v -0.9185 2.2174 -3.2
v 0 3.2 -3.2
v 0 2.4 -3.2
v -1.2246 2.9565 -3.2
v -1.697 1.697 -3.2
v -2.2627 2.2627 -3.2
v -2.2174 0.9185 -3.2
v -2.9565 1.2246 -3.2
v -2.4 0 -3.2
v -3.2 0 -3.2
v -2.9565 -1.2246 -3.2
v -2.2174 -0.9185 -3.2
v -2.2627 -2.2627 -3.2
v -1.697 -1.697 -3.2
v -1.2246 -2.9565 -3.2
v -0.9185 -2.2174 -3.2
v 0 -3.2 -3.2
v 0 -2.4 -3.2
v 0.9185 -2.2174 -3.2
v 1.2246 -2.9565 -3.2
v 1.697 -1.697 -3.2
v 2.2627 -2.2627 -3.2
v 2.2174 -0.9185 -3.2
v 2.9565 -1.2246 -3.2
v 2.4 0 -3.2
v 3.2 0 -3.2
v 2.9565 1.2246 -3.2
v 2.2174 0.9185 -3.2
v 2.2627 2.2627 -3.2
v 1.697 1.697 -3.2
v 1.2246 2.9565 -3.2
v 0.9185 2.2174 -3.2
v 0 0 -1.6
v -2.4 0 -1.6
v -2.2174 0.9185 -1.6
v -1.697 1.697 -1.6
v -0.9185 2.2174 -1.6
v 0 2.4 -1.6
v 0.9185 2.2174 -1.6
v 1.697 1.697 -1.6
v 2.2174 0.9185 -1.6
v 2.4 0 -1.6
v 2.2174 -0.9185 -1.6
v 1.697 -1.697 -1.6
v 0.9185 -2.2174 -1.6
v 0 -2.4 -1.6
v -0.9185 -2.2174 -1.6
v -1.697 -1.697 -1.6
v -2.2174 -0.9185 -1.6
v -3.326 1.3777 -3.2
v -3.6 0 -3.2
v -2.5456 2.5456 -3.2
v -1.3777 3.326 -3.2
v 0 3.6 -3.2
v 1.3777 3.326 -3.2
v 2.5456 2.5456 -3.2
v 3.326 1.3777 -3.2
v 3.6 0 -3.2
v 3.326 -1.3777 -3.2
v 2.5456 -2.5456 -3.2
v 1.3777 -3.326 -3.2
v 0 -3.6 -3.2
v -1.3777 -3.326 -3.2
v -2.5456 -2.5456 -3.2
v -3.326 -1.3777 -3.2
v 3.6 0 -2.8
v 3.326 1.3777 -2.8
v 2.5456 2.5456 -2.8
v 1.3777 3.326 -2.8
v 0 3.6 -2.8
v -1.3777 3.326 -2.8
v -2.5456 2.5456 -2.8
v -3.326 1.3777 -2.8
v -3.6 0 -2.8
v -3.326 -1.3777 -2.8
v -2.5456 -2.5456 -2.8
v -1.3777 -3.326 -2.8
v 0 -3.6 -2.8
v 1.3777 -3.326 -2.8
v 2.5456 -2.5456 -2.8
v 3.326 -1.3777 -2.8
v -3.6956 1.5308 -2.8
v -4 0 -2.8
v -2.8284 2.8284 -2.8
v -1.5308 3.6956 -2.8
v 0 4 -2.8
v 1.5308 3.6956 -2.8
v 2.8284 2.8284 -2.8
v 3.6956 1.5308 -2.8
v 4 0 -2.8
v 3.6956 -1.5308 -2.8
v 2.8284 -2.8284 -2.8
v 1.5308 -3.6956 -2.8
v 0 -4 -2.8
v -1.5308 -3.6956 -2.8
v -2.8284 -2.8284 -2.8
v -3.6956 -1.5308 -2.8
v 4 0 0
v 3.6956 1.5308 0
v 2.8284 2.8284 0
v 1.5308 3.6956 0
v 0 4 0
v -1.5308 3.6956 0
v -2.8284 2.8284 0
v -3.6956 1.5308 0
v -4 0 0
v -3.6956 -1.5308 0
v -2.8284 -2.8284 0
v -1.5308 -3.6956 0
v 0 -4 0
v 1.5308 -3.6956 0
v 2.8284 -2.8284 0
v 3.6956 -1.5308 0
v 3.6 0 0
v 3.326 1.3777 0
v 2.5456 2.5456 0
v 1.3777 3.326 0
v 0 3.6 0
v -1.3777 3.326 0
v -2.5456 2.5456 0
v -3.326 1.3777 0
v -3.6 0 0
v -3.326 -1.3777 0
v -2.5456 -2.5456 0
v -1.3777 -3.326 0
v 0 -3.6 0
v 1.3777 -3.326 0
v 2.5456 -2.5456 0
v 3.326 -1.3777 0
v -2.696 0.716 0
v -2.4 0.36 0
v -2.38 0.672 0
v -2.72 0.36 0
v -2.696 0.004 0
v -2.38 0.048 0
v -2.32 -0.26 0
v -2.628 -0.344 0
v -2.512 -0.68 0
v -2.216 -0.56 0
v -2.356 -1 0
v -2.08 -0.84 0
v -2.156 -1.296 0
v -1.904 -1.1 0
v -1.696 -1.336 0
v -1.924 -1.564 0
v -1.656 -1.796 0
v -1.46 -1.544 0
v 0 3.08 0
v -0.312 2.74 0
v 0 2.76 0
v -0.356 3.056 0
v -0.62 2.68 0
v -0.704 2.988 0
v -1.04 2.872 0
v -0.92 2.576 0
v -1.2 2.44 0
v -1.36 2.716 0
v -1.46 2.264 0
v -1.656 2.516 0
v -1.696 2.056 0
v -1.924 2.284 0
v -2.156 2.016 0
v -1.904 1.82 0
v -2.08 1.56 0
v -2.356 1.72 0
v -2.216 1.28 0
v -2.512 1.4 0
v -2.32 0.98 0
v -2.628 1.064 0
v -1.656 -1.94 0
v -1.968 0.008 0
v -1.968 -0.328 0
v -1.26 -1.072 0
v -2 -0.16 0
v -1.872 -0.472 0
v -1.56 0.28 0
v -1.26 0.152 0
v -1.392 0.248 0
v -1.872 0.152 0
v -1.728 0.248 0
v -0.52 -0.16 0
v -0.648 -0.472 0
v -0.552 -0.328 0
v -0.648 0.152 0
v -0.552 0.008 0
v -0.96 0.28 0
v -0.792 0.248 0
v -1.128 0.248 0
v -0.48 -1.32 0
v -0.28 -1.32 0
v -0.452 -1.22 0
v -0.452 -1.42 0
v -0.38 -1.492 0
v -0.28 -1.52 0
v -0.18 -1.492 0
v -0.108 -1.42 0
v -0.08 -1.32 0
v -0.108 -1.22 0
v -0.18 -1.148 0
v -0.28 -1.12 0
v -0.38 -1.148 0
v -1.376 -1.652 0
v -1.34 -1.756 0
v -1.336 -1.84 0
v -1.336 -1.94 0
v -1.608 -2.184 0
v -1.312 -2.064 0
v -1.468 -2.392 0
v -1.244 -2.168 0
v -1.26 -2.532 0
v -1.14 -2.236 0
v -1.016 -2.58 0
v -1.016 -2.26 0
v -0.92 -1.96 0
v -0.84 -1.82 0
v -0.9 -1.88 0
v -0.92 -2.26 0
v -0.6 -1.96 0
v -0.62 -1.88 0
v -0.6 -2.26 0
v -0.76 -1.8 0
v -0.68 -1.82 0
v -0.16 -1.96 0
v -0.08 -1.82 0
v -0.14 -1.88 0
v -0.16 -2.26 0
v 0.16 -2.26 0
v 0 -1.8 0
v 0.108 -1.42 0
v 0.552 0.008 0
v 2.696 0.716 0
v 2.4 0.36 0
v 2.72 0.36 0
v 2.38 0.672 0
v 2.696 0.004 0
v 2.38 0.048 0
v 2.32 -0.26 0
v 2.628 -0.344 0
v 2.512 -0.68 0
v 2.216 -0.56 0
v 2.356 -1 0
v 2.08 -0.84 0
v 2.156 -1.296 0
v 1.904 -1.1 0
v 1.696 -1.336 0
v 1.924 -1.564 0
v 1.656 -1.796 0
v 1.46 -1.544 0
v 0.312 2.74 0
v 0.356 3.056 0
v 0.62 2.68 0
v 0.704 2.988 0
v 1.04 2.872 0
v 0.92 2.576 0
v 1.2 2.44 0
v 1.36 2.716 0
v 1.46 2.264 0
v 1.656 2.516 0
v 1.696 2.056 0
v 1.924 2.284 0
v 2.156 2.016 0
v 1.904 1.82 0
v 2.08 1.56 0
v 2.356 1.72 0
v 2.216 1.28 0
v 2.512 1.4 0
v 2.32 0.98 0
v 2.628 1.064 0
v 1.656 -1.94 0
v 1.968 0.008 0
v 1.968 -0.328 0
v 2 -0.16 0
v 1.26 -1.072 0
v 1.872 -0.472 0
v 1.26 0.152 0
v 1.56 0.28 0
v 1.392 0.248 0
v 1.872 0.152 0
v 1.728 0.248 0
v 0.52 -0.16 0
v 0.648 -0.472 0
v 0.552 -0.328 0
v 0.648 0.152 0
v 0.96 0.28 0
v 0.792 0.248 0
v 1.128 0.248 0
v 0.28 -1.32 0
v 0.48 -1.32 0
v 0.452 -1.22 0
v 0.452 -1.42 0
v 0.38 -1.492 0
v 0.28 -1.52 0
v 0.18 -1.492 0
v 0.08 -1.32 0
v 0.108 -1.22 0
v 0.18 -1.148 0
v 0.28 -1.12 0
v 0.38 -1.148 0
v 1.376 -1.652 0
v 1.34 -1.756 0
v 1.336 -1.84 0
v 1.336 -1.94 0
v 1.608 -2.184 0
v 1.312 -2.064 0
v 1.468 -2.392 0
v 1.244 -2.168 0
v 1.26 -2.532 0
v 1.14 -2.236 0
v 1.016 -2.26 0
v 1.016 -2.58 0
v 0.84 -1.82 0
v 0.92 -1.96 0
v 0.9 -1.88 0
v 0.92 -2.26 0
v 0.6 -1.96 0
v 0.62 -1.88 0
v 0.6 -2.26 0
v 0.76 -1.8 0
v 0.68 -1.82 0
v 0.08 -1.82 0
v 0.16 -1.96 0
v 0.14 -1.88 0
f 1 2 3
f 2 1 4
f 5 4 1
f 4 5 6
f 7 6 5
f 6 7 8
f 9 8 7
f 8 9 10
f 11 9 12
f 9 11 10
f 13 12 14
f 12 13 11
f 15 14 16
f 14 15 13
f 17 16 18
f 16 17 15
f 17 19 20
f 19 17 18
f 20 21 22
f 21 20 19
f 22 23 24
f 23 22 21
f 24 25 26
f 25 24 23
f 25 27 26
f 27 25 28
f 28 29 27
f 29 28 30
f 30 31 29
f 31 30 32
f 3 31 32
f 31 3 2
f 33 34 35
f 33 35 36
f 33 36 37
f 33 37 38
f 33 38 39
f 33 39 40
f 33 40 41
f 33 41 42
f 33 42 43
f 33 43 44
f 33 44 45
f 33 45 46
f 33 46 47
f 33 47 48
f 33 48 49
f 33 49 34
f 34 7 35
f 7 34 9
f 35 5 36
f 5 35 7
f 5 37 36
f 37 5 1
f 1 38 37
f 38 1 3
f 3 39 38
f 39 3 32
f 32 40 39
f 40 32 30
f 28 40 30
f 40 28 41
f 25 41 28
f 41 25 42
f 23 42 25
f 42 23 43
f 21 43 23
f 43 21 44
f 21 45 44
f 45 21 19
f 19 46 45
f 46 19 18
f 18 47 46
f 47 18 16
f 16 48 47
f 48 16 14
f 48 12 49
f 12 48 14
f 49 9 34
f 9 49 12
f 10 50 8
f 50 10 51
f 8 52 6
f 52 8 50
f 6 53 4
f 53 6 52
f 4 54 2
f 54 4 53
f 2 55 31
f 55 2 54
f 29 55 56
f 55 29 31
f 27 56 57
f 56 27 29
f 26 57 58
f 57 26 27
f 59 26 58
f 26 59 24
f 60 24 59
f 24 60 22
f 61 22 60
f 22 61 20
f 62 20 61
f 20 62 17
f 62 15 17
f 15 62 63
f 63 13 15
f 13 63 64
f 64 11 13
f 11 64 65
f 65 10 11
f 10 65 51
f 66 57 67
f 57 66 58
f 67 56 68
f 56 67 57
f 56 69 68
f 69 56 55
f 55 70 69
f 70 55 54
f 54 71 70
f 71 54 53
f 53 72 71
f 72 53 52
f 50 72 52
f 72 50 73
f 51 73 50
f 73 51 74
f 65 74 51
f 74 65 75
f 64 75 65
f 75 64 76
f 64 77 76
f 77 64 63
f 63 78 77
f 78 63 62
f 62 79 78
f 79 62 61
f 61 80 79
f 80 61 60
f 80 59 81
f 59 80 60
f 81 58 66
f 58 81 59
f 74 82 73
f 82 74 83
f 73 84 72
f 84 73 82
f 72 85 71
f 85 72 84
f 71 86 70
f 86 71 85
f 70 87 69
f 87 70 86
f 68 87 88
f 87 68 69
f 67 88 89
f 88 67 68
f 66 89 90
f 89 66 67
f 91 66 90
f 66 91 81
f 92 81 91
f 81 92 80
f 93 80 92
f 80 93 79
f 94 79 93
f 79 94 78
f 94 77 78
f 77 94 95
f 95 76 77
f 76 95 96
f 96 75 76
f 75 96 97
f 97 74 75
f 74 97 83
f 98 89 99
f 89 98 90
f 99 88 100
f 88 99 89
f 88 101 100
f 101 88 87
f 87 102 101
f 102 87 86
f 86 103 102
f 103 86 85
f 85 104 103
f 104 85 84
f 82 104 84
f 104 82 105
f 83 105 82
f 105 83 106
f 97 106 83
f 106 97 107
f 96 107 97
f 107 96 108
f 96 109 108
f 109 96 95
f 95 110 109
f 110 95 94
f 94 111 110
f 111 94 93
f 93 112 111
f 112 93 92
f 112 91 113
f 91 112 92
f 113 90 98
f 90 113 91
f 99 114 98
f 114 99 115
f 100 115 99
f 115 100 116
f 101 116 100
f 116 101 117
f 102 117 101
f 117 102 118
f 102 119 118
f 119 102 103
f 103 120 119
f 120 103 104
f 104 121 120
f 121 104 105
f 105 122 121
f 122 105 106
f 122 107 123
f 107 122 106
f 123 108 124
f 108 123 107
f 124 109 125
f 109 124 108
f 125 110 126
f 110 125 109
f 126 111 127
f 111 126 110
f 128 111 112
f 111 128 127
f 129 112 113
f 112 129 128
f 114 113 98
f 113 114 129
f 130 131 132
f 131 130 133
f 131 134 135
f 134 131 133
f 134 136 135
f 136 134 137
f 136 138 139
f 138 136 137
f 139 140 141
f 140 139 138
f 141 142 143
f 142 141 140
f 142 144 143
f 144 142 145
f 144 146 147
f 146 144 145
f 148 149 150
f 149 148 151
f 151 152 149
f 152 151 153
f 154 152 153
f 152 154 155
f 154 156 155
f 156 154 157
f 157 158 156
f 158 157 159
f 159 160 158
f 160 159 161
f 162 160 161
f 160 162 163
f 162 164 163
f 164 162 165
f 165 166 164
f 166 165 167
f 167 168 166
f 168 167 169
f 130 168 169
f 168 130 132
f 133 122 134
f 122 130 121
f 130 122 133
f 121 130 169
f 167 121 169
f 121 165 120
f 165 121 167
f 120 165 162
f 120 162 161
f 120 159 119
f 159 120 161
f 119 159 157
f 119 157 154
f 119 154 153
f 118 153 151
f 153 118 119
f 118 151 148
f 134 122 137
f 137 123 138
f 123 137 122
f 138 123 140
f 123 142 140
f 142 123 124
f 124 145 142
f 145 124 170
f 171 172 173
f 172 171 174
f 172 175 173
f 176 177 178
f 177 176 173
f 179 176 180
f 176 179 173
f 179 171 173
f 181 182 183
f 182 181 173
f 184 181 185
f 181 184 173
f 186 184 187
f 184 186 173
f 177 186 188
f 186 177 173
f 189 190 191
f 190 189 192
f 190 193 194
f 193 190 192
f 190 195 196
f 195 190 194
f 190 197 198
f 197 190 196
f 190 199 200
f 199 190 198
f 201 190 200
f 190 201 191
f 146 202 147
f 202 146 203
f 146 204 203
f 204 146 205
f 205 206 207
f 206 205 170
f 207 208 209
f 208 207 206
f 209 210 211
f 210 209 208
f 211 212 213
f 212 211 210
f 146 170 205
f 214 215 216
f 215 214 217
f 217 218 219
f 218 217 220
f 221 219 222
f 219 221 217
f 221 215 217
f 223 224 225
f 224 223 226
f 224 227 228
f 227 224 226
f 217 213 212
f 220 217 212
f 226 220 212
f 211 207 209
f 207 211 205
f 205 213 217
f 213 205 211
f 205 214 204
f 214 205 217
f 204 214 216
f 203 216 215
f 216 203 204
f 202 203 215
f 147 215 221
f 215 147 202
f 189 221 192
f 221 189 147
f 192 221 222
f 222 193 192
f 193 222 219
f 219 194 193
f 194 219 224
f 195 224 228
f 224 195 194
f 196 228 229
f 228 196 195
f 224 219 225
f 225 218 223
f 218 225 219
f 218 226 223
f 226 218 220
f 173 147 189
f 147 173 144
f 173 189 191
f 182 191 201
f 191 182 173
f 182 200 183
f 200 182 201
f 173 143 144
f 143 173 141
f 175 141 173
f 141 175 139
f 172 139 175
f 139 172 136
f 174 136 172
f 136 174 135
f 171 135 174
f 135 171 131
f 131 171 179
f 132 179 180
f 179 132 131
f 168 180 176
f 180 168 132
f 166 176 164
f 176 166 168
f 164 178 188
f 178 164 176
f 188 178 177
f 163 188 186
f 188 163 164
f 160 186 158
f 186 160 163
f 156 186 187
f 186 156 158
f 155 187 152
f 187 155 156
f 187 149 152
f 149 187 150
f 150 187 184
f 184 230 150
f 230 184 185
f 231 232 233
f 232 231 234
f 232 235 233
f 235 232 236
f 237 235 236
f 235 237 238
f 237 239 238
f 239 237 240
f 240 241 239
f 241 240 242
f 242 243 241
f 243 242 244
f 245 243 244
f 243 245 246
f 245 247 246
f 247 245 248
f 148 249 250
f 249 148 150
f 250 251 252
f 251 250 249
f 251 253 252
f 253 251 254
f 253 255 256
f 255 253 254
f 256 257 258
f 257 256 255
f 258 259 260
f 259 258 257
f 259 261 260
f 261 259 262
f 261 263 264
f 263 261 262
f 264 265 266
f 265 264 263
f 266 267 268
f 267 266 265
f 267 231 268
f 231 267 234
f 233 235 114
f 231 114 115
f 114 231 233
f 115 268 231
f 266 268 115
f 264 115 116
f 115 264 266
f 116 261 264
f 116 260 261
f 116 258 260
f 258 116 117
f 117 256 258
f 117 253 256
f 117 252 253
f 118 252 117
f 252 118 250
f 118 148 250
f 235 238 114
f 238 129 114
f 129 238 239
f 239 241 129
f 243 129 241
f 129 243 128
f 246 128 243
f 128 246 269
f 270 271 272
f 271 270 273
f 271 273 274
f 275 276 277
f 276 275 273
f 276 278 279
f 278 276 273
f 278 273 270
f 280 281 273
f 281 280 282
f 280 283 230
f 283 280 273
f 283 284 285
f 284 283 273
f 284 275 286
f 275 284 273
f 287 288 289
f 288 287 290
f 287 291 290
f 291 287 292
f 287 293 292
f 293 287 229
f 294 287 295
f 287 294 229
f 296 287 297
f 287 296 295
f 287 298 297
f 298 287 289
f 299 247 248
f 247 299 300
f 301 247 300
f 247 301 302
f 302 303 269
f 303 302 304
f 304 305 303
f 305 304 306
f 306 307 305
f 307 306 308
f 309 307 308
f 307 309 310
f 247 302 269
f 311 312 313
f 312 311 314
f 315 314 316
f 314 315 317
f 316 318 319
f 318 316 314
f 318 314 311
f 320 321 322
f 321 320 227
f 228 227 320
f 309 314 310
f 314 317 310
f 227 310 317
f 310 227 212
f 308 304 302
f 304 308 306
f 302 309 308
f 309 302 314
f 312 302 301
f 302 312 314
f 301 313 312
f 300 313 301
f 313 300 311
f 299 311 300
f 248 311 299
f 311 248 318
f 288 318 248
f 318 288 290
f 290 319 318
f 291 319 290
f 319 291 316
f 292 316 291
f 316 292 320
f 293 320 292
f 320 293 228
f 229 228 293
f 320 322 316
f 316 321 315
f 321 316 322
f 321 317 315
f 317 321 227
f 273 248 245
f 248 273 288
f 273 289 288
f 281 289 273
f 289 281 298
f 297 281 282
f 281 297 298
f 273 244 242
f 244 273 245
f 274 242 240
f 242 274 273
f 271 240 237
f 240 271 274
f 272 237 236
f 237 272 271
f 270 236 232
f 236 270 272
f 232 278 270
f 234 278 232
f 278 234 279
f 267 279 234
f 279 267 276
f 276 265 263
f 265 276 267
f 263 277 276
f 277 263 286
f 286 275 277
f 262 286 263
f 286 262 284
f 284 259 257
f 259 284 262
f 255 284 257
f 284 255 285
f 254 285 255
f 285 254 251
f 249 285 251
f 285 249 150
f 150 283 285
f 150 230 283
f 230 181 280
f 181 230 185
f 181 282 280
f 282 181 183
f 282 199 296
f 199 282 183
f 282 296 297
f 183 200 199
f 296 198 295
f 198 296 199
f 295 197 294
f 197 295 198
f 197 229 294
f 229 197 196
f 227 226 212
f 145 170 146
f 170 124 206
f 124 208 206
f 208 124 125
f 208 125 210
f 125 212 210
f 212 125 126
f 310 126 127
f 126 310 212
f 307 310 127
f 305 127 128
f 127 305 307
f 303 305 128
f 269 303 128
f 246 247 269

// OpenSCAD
use <../lib.scad>
use <../p/4-4ering.scad>
use <s/98138s01.scad>
$fa=1; $fs=0.2;
function ldraw_lib__98138p1c(realsolid=false) = [
// 0 Tile  1 x  1 Round with Medium Lavender Skull Outline and Hearts as Eyes on Medium Azure Background Pattern
// 0 Name: 98138p1c.dat
// 0 Author: Gerald Lasser [GeraldLasser]
// 0 !LDRAW_ORG Part UPDATE 2022-01
// 0 !LICENSE Licensed under CC BY 2.0 and CC BY 4.0 : see CAreadme.txt
// 
// 0 BFC CERTIFY CCW
  [0,"BFC","CERTIFY"],
  [0,"BFC","CCW"],
// 
// 0 !KEYWORDS Bricklink 98138pb132, Dots, Set 41908
// 
// 0 !HISTORY 2022-01-14 [PTadmin] Official Update 2022-01
// 
// 
// 1 16 0 0 0 1 0 0 0 1 0 0 0 1 s\98138s01.dat
  [1,16,0,0,0,1,0,0,0,1,0,0,0,1, ldraw_lib__s__98138s01(realsolid)],
// 1 322 0 0 0 9 0 0 0 1 0 0 0 9 4-4ering.dat
  [1,322,0,0,0,9,0,0,0,1,0,0,0,9, ldraw_lib__4_4ering(realsolid)],
// 4 30 -6 0 .9 -5.95 0 1.68 -6.74 0 1.79 -6.8 0 .9
  [4,30,-6,0,.9,-5.95,0,1.68,-6.74,0,1.79,-6.8,0,.9],
// 4 30 -5.95 0 .12 -6 0 .9 -6.8 0 .9 -6.74 0 .01
  [4,30,-5.95,0,.12,-6,0,.9,-6.8,0,.9,-6.74,0,.01],
// 4 30 -5.8 0 -.65 -5.95 0 .12 -6.74 0 .01 -6.57 0 -.86
  [4,30,-5.8,0,-.65,-5.95,0,.12,-6.74,0,.01,-6.57,0,-.86],
// 4 30 -5.54 0 -1.4 -5.8 0 -.65 -6.57 0 -.86 -6.28 0 -1.7
  [4,30,-5.54,0,-1.4,-5.8,0,-.65,-6.57,0,-.86,-6.28,0,-1.7],
// 4 30 -5.2 0 -2.1 -5.54 0 -1.4 -6.28 0 -1.7 -5.89 0 -2.5
  [4,30,-5.2,0,-2.1,-5.54,0,-1.4,-6.28,0,-1.7,-5.89,0,-2.5],
// 4 30 -4.76 0 -2.75 -5.2 0 -2.1 -5.89 0 -2.5 -5.39 0 -3.24
  [4,30,-4.76,0,-2.75,-5.2,0,-2.1,-5.89,0,-2.5,-5.39,0,-3.24],
// 4 30 -4.24 0 -3.34 -4.76 0 -2.75 -5.39 0 -3.24 -4.81 0 -3.91
  [4,30,-4.24,0,-3.34,-4.76,0,-2.75,-5.39,0,-3.24,-4.81,0,-3.91],
// 4 30 -3.65 0 -3.86 -4.24 0 -3.34 -4.81 0 -3.91 -4.14 0 -4.49
  [4,30,-3.65,0,-3.86,-4.24,0,-3.34,-4.81,0,-3.91,-4.14,0,-4.49],
// 4 30 -.78 0 6.85 0 0 6.9 0 0 7.7 -.89 0 7.64
  [4,30,-.78,0,6.85,0,0,6.9,0,0,7.7,-.89,0,7.64],
// 4 30 -1.55 0 6.7 -.78 0 6.85 -.89 0 7.64 -1.76 0 7.47
  [4,30,-1.55,0,6.7,-.78,0,6.85,-.89,0,7.64,-1.76,0,7.47],
// 4 30 -2.3 0 6.44 -1.55 0 6.7 -1.76 0 7.47 -2.6 0 7.18
  [4,30,-2.3,0,6.44,-1.55,0,6.7,-1.76,0,7.47,-2.6,0,7.18],
// 4 30 -3 0 6.1 -2.3 0 6.44 -2.6 0 7.18 -3.4 0 6.79
  [4,30,-3,0,6.1,-2.3,0,6.44,-2.6,0,7.18,-3.4,0,6.79],
// 4 30 -3.65 0 5.66 -3 0 6.1 -3.4 0 6.79 -4.14 0 6.29
  [4,30,-3.65,0,5.66,-3,0,6.1,-3.4,0,6.79,-4.14,0,6.29],
// 4 30 -4.24 0 5.14 -3.65 0 5.66 -4.14 0 6.29 -4.81 0 5.71
  [4,30,-4.24,0,5.14,-3.65,0,5.66,-4.14,0,6.29,-4.81,0,5.71],
// 4 30 -4.76 0 4.55 -4.24 0 5.14 -4.81 0 5.71 -5.39 0 5.04
  [4,30,-4.76,0,4.55,-4.24,0,5.14,-4.81,0,5.71,-5.39,0,5.04],
// 4 30 -5.2 0 3.9 -4.76 0 4.55 -5.39 0 5.04 -5.89 0 4.3
  [4,30,-5.2,0,3.9,-4.76,0,4.55,-5.39,0,5.04,-5.89,0,4.3],
// 4 30 -5.54 0 3.2 -5.2 0 3.9 -5.89 0 4.3 -6.28 0 3.5
  [4,30,-5.54,0,3.2,-5.2,0,3.9,-5.89,0,4.3,-6.28,0,3.5],
// 4 30 -5.8 0 2.45 -5.54 0 3.2 -6.28 0 3.5 -6.57 0 2.66
  [4,30,-5.8,0,2.45,-5.54,0,3.2,-6.28,0,3.5,-6.57,0,2.66],
// 4 30 -5.95 0 1.68 -5.8 0 2.45 -6.57 0 2.66 -6.74 0 1.79
  [4,30,-5.95,0,1.68,-5.8,0,2.45,-6.57,0,2.66,-6.74,0,1.79],
// 3 322 -6.8 0 .9 -9 0 0 -6.74 0 .01
  [3,322,-6.8,0,.9,-9,0,0,-6.74,0,.01],
// 4 322 -9 0 0 -6.8 0 .9 -6.74 0 1.79 -8.3151 0 3.4443
  [4,322,-9,0,0,-6.8,0,.9,-6.74,0,1.79,-8.3151,0,3.4443],
// 3 322 -8.3151 0 3.4443 -6.74 0 1.79 -6.57 0 2.66
  [3,322,-8.3151,0,3.4443,-6.74,0,1.79,-6.57,0,2.66],
// 3 322 -6.28 0 3.5 -8.3151 0 3.4443 -6.57 0 2.66
  [3,322,-6.28,0,3.5,-8.3151,0,3.4443,-6.57,0,2.66],
// 4 322 -8.3151 0 3.4443 -6.28 0 3.5 -5.89 0 4.3 -6.3639 0 6.3639
  [4,322,-8.3151,0,3.4443,-6.28,0,3.5,-5.89,0,4.3,-6.3639,0,6.3639],
// 3 322 -6.3639 0 6.3639 -5.89 0 4.3 -5.39 0 5.04
  [3,322,-6.3639,0,6.3639,-5.89,0,4.3,-5.39,0,5.04],
// 3 322 -6.3639 0 6.3639 -5.39 0 5.04 -4.81 0 5.71
  [3,322,-6.3639,0,6.3639,-5.39,0,5.04,-4.81,0,5.71],
// 4 322 -6.3639 0 6.3639 -4.81 0 5.71 -4.14 0 6.29 -3.4443 0 8.3151
  [4,322,-6.3639,0,6.3639,-4.81,0,5.71,-4.14,0,6.29,-3.4443,0,8.3151],
// 3 322 -3.4443 0 8.3151 -4.14 0 6.29 -3.4 0 6.79
  [3,322,-3.4443,0,8.3151,-4.14,0,6.29,-3.4,0,6.79],
// 3 322 -3.4443 0 8.3151 -3.4 0 6.79 -2.6 0 7.18
  [3,322,-3.4443,0,8.3151,-3.4,0,6.79,-2.6,0,7.18],
// 3 322 -3.4443 0 8.3151 -2.6 0 7.18 -1.76 0 7.47
  [3,322,-3.4443,0,8.3151,-2.6,0,7.18,-1.76,0,7.47],
// 4 322 -3.4443 0 8.3151 -1.76 0 7.47 -.89 0 7.64 0 0 9
  [4,322,-3.4443,0,8.3151,-1.76,0,7.47,-.89,0,7.64,0,0,9],
// 3 322 0 0 9 -.89 0 7.64 0 0 7.7
  [3,322,0,0,9,-.89,0,7.64,0,0,7.7],
// 3 322 -6.74 0 .01 -9 0 0 -6.57 0 -.86
  [3,322,-6.74,0,.01,-9,0,0,-6.57,0,-.86],
// 4 322 -6.28 0 -1.7 -6.57 0 -.86 -9 0 0 -8.3151 0 -3.4443
  [4,322,-6.28,0,-1.7,-6.57,0,-.86,-9,0,0,-8.3151,0,-3.4443],
// 3 322 -6.28 0 -1.7 -8.3151 0 -3.4443 -5.89 0 -2.5
  [3,322,-6.28,0,-1.7,-8.3151,0,-3.4443,-5.89,0,-2.5],
// 4 322 -5.39 0 -3.24 -5.89 0 -2.5 -8.3151 0 -3.4443 -6.3639 0 -6.3639
  [4,322,-5.39,0,-3.24,-5.89,0,-2.5,-8.3151,0,-3.4443,-6.3639,0,-6.3639],
// 4 322 -4.81 0 -3.91 -5.39 0 -3.24 -6.3639 0 -6.3639 -4.14 0 -4.85
  [4,322,-4.81,0,-3.91,-5.39,0,-3.24,-6.3639,0,-6.3639,-4.14,0,-4.85],
// 4 30 -3.15 0 -2.68 -4.92 0 .02 -5 0 -.4 -4.92 0 -.82
  [4,30,-3.15,0,-2.68,-4.92,0,.02,-5,0,-.4,-4.92,0,-.82],
// 3 30 -4.92 0 -.82 -4.68 0 -1.18 -3.15 0 -2.68
  [3,30,-4.92,0,-.82,-4.68,0,-1.18,-3.15,0,-2.68],
// 4 30 -3.15 0 -2.68 -3.15 0 .38 -3.48 0 .62 -3.9 0 .7
  [4,30,-3.15,0,-2.68,-3.15,0,.38,-3.48,0,.62,-3.9,0,.7],
// 4 30 -3.15 0 -2.68 -3.9 0 .7 -4.32 0 .62 -4.68 0 .38
  [4,30,-3.15,0,-2.68,-3.9,0,.7,-4.32,0,.62,-4.68,0,.38],
// 3 30 -4.68 0 .38 -4.92 0 .02 -3.15 0 -2.68
  [3,30,-4.68,0,.38,-4.92,0,.02,-3.15,0,-2.68],
// 4 30 -3.15 0 -2.68 -1.62 0 -1.18 -1.38 0 -.82 -1.3 0 -.4
  [4,30,-3.15,0,-2.68,-1.62,0,-1.18,-1.38,0,-.82,-1.3,0,-.4],
// 4 30 -3.15 0 -2.68 -1.3 0 -.4 -1.38 0 .02 -1.62 0 .38
  [4,30,-3.15,0,-2.68,-1.3,0,-.4,-1.38,0,.02,-1.62,0,.38],
// 4 30 -3.15 0 -2.68 -1.62 0 .38 -1.98 0 .62 -2.4 0 .7
  [4,30,-3.15,0,-2.68,-1.62,0,.38,-1.98,0,.62,-2.4,0,.7],
// 4 30 -3.15 0 -2.68 -2.4 0 .7 -2.82 0 .62 -3.15 0 .38
  [4,30,-3.15,0,-2.68,-2.4,0,.7,-2.82,0,.62,-3.15,0,.38],
// 4 30 -.7 0 -3.3 -1.13 0 -3.05 -1.2 0 -3.3 -1.13 0 -3.55
  [4,30,-.7,0,-3.3,-1.13,0,-3.05,-1.2,0,-3.3,-1.13,0,-3.55],
// 4 30 -.7 0 -3.3 -1.13 0 -3.55 -.95 0 -3.73 -.7 0 -3.8
  [4,30,-.7,0,-3.3,-1.13,0,-3.55,-.95,0,-3.73,-.7,0,-3.8],
// 4 30 -.7 0 -3.3 -.7 0 -3.8 -.45 0 -3.73 -.27 0 -3.55
  [4,30,-.7,0,-3.3,-.7,0,-3.8,-.45,0,-3.73,-.27,0,-3.55],
// 4 30 -.7 0 -3.3 -.27 0 -3.55 -.2 0 -3.3 -.27 0 -3.05
  [4,30,-.7,0,-3.3,-.27,0,-3.55,-.2,0,-3.3,-.27,0,-3.05],
// 4 30 -.7 0 -3.3 -.27 0 -3.05 -.45 0 -2.87 -.7 0 -2.8
  [4,30,-.7,0,-3.3,-.27,0,-3.05,-.45,0,-2.87,-.7,0,-2.8],
// 4 30 -.7 0 -3.3 -.7 0 -2.8 -.95 0 -2.87 -1.13 0 -3.05
  [4,30,-.7,0,-3.3,-.7,0,-2.8,-.95,0,-2.87,-1.13,0,-3.05],
// 4 30 -3.44 0 -4.13 -3.65 0 -3.86 -4.14 0 -4.49 -3.35 0 -4.39
  [4,30,-3.44,0,-4.13,-3.65,0,-3.86,-4.14,0,-4.49,-3.35,0,-4.39],
// 4 30 -3.34 0 -4.6 -3.35 0 -4.39 -4.14 0 -4.49 -3.34 0 -4.85
  [4,30,-3.34,0,-4.6,-3.35,0,-4.39,-4.14,0,-4.49,-3.34,0,-4.85],
// 4 30 -3.28 0 -5.16 -3.34 0 -4.85 -4.14 0 -4.85 -4.02 0 -5.46
  [4,30,-3.28,0,-5.16,-3.34,0,-4.85,-4.14,0,-4.85,-4.02,0,-5.46],
// 4 30 -3.11 0 -5.42 -3.28 0 -5.16 -4.02 0 -5.46 -3.67 0 -5.98
  [4,30,-3.11,0,-5.42,-3.28,0,-5.16,-4.02,0,-5.46,-3.67,0,-5.98],
// 4 30 -2.85 0 -5.59 -3.11 0 -5.42 -3.67 0 -5.98 -3.15 0 -6.33
  [4,30,-2.85,0,-5.59,-3.11,0,-5.42,-3.67,0,-5.98,-3.15,0,-6.33],
// 4 30 -2.54 0 -5.65 -2.85 0 -5.59 -3.15 0 -6.33 -2.54 0 -6.45
  [4,30,-2.54,0,-5.65,-2.85,0,-5.59,-3.15,0,-6.33,-2.54,0,-6.45],
// 3 30 -4.14 0 -4.49 -4.14 0 -4.85 -3.34 0 -4.85
  [3,30,-4.14,0,-4.49,-4.14,0,-4.85,-3.34,0,-4.85],
// 4 30 -2.25 0 -4.7 -2.3 0 -4.9 -2.3 0 -5.65 -2.1 0 -4.55
  [4,30,-2.25,0,-4.7,-2.3,0,-4.9,-2.3,0,-5.65,-2.1,0,-4.55],
// 4 30 -2.3 0 -5.65 -1.5 0 -5.65 -1.5 0 -4.9 -1.55 0 -4.7
  [4,30,-2.3,0,-5.65,-1.5,0,-5.65,-1.5,0,-4.9,-1.55,0,-4.7],
// 4 30 -2.3 0 -5.65 -1.55 0 -4.7 -1.7 0 -4.55 -1.9 0 -4.5
  [4,30,-2.3,0,-5.65,-1.55,0,-4.7,-1.7,0,-4.55,-1.9,0,-4.5],
// 3 30 -1.9 0 -4.5 -2.1 0 -4.55 -2.3 0 -5.65
  [3,30,-1.9,0,-4.5,-2.1,0,-4.55,-2.3,0,-5.65],
// 4 30 -.35 0 -4.7 -.4 0 -4.9 -.4 0 -5.65 -.2 0 -4.55
  [4,30,-.35,0,-4.7,-.4,0,-4.9,-.4,0,-5.65,-.2,0,-4.55],
// 4 30 0 0 -4.5 -.2 0 -4.55 -.4 0 -5.65 .4 0 -5.65
  [4,30,0,0,-4.5,-.2,0,-4.55,-.4,0,-5.65,.4,0,-5.65],
// 3 30 -2.3 0 -5.65 -2.54 0 -5.65 -2.54 0 -6.45
  [3,30,-2.3,0,-5.65,-2.54,0,-5.65,-2.54,0,-6.45],
// 3 30 -1.5 0 -5.65 -2.3 0 -5.65 -2.54 0 -6.45
  [3,30,-1.5,0,-5.65,-2.3,0,-5.65,-2.54,0,-6.45],
// 3 30 -.4 0 -5.65 -1.5 0 -5.65 -2.54 0 -6.45
  [3,30,-.4,0,-5.65,-1.5,0,-5.65,-2.54,0,-6.45],
// 4 16 -3.28 0 -5.16 -3.11 0 -5.42 -2.85 0 -5.59 -3.34 0 -4.85
  [4,16,-3.28,0,-5.16,-3.11,0,-5.42,-2.85,0,-5.59,-3.34,0,-4.85],
// 4 16 -3.34 0 -4.85 -2.85 0 -5.59 -2.54 0 -5.65 -2.3 0 -5.65
  [4,16,-3.34,0,-4.85,-2.85,0,-5.59,-2.54,0,-5.65,-2.3,0,-5.65],
// 4 16 -3.34 0 -4.85 -2.3 0 -5.65 -2.3 0 -4.9 -3.34 0 -4.6
  [4,16,-3.34,0,-4.85,-2.3,0,-5.65,-2.3,0,-4.9,-3.34,0,-4.6],
// 3 16 -3.34 0 -4.6 -2.3 0 -4.9 -2.25 0 -4.7
  [3,16,-3.34,0,-4.6,-2.3,0,-4.9,-2.25,0,-4.7],
// 4 16 -3.34 0 -4.6 -2.25 0 -4.7 -2.1 0 -4.55 -3.35 0 -4.39
  [4,16,-3.34,0,-4.6,-2.25,0,-4.7,-2.1,0,-4.55,-3.35,0,-4.39],
// 3 16 -3.44 0 -4.13 -3.35 0 -4.39 -2.1 0 -4.55
  [3,16,-3.44,0,-4.13,-3.35,0,-4.39,-2.1,0,-4.55],
// 4 16 -3.65 0 -3.86 -3.44 0 -4.13 -2.1 0 -4.55 -1.9 0 -4.5
  [4,16,-3.65,0,-3.86,-3.44,0,-4.13,-2.1,0,-4.55,-1.9,0,-4.5],
// 4 16 -1.2 0 -3.3 -3.65 0 -3.86 -1.9 0 -4.5 -1.13 0 -3.55
  [4,16,-1.2,0,-3.3,-3.65,0,-3.86,-1.9,0,-4.5,-1.13,0,-3.55],
// 3 16 -1.13 0 -3.55 -1.9 0 -4.5 -1.7 0 -4.55
  [3,16,-1.13,0,-3.55,-1.9,0,-4.5,-1.7,0,-4.55],
// 4 16 -1.13 0 -3.55 -1.7 0 -4.55 -1.55 0 -4.7 -.95 0 -3.73
  [4,16,-1.13,0,-3.55,-1.7,0,-4.55,-1.55,0,-4.7,-.95,0,-3.73],
// 4 16 -.7 0 -3.8 -.95 0 -3.73 -1.55 0 -4.7 -.2 0 -4.55
  [4,16,-.7,0,-3.8,-.95,0,-3.73,-1.55,0,-4.7,-.2,0,-4.55],
// 4 16 -.7 0 -3.8 -.2 0 -4.55 0 0 -4.5 -.45 0 -3.73
  [4,16,-.7,0,-3.8,-.2,0,-4.55,0,0,-4.5,-.45,0,-3.73],
// 4 16 -.27 0 -3.55 -.45 0 -3.73 0 0 -4.5 .27 0 -3.55
  [4,16,-.27,0,-3.55,-.45,0,-3.73,0,0,-4.5,.27,0,-3.55],
// 3 16 -.2 0 -4.55 -1.55 0 -4.7 -.35 0 -4.7
  [3,16,-.2,0,-4.55,-1.55,0,-4.7,-.35,0,-4.7],
// 4 16 -1.55 0 -4.7 -1.5 0 -4.9 -.4 0 -4.9 -.35 0 -4.7
  [4,16,-1.55,0,-4.7,-1.5,0,-4.9,-.4,0,-4.9,-.35,0,-4.7],
// 4 16 -.4 0 -4.9 -1.5 0 -4.9 -1.5 0 -5.65 -.4 0 -5.65
  [4,16,-.4,0,-4.9,-1.5,0,-4.9,-1.5,0,-5.65,-.4,0,-5.65],
// 4 16 -3.15 0 -2.68 -4.24 0 -3.34 -3.65 0 -3.86 -1.2 0 -3.3
  [4,16,-3.15,0,-2.68,-4.24,0,-3.34,-3.65,0,-3.86,-1.2,0,-3.3],
// 3 16 -3.15 0 -2.68 -1.2 0 -3.3 -1.13 0 -3.05
  [3,16,-3.15,0,-2.68,-1.2,0,-3.3,-1.13,0,-3.05],
// 4 16 -3.15 0 -2.68 -1.13 0 -3.05 -.95 0 -2.87 -1.62 0 -1.18
  [4,16,-3.15,0,-2.68,-1.13,0,-3.05,-.95,0,-2.87,-1.62,0,-1.18],
// 4 16 -1.62 0 -1.18 -.95 0 -2.87 -.7 0 -2.8 -1.38 0 -.82
  [4,16,-1.62,0,-1.18,-.95,0,-2.87,-.7,0,-2.8,-1.38,0,-.82],
// 4 16 -4.76 0 -2.75 -4.24 0 -3.34 -3.15 0 -2.68 -5.2 0 -2.1
  [4,16,-4.76,0,-2.75,-4.24,0,-3.34,-3.15,0,-2.68,-5.2,0,-2.1],
// 4 16 -5.2 0 -2.1 -3.15 0 -2.68 -4.68 0 -1.18 -5.54 0 -1.4
  [4,16,-5.2,0,-2.1,-3.15,0,-2.68,-4.68,0,-1.18,-5.54,0,-1.4],
// 4 16 -5.54 0 -1.4 -4.68 0 -1.18 -4.92 0 -.82 -5.8 0 -.65
  [4,16,-5.54,0,-1.4,-4.68,0,-1.18,-4.92,0,-.82,-5.8,0,-.65],
// 4 16 -5.8 0 -.65 -4.92 0 -.82 -5 0 -.4 -5.95 0 .12
  [4,16,-5.8,0,-.65,-4.92,0,-.82,-5,0,-.4,-5.95,0,.12],
// 4 16 -5.95 0 .12 -5 0 -.4 -4.92 0 .02 -6 0 .9
  [4,16,-5.95,0,.12,-5,0,-.4,-4.92,0,.02,-6,0,.9],
// 3 16 -6 0 .9 -4.92 0 .02 -4.68 0 .38
  [3,16,-6,0,.9,-4.92,0,.02,-4.68,0,.38],
// 4 16 -6 0 .9 -4.68 0 .38 -4.32 0 .62 -5.95 0 1.68
  [4,16,-6,0,.9,-4.68,0,.38,-4.32,0,.62,-5.95,0,1.68],
// 4 16 -5.8 0 2.45 -5.95 0 1.68 -4.32 0 .62 -3.9 0 .7
  [4,16,-5.8,0,2.45,-5.95,0,1.68,-4.32,0,.62,-3.9,0,.7],
// 4 16 -5.54 0 3.2 -5.8 0 2.45 -3.9 0 .7 -5.2 0 3.9
  [4,16,-5.54,0,3.2,-5.8,0,2.45,-3.9,0,.7,-5.2,0,3.9],
// 4 16 -5.2 0 3.9 -3.9 0 .7 -3.48 0 .62 -2.82 0 .62
  [4,16,-5.2,0,3.9,-3.9,0,.7,-3.48,0,.62,-2.82,0,.62],
// 3 16 -2.82 0 .62 -3.48 0 .62 -3.15 0 .38
  [3,16,-2.82,0,.62,-3.48,0,.62,-3.15,0,.38],
// 4 16 -5.2 0 3.9 -2.82 0 .62 -2.4 0 .7 -4.76 0 4.55
  [4,16,-5.2,0,3.9,-2.82,0,.62,-2.4,0,.7,-4.76,0,4.55],
// 4 16 -4.24 0 5.14 -4.76 0 4.55 -2.4 0 .7 -3.65 0 5.66
  [4,16,-4.24,0,5.14,-4.76,0,4.55,-2.4,0,.7,-3.65,0,5.66],
// 4 16 -3.65 0 5.66 -2.4 0 .7 -1.98 0 .62 -3 0 6.1
  [4,16,-3.65,0,5.66,-2.4,0,.7,-1.98,0,.62,-3,0,6.1],
// 4 16 -2.3 0 6.44 -3 0 6.1 -1.98 0 .62 -1.55 0 6.7
  [4,16,-2.3,0,6.44,-3,0,6.1,-1.98,0,.62,-1.55,0,6.7],
// 4 16 -.78 0 6.85 -1.55 0 6.7 -1.98 0 .62 0 0 6.9
  [4,16,-.78,0,6.85,-1.55,0,6.7,-1.98,0,.62,0,0,6.9],
// 3 16 0 0 6.9 -1.98 0 .62 -1.62 0 .38
  [3,16,0,0,6.9,-1.98,0,.62,-1.62,0,.38],
// 4 16 0 0 6.9 -1.62 0 .38 -1.38 0 .02 1.38 0 .02
  [4,16,0,0,6.9,-1.62,0,.38,-1.38,0,.02,1.38,0,.02],
// 4 30 6.74 0 1.79 5.95 0 1.68 6 0 .9 6.8 0 .9
  [4,30,6.74,0,1.79,5.95,0,1.68,6,0,.9,6.8,0,.9],
// 4 30 6.8 0 .9 6 0 .9 5.95 0 .12 6.74 0 .01
  [4,30,6.8,0,.9,6,0,.9,5.95,0,.12,6.74,0,.01],
// 4 30 6.74 0 .01 5.95 0 .12 5.8 0 -.65 6.57 0 -.86
  [4,30,6.74,0,.01,5.95,0,.12,5.8,0,-.65,6.57,0,-.86],
// 4 30 6.57 0 -.86 5.8 0 -.65 5.54 0 -1.4 6.28 0 -1.7
  [4,30,6.57,0,-.86,5.8,0,-.65,5.54,0,-1.4,6.28,0,-1.7],
// 4 30 6.28 0 -1.7 5.54 0 -1.4 5.2 0 -2.1 5.89 0 -2.5
  [4,30,6.28,0,-1.7,5.54,0,-1.4,5.2,0,-2.1,5.89,0,-2.5],
// 4 30 5.89 0 -2.5 5.2 0 -2.1 4.76 0 -2.75 5.39 0 -3.24
  [4,30,5.89,0,-2.5,5.2,0,-2.1,4.76,0,-2.75,5.39,0,-3.24],
// 4 30 5.39 0 -3.24 4.76 0 -2.75 4.24 0 -3.34 4.81 0 -3.91
  [4,30,5.39,0,-3.24,4.76,0,-2.75,4.24,0,-3.34,4.81,0,-3.91],
// 4 30 4.81 0 -3.91 4.24 0 -3.34 3.65 0 -3.86 4.14 0 -4.49
  [4,30,4.81,0,-3.91,4.24,0,-3.34,3.65,0,-3.86,4.14,0,-4.49],
// 4 30 0 0 7.7 0 0 6.9 .78 0 6.85 .89 0 7.64
  [4,30,0,0,7.7,0,0,6.9,.78,0,6.85,.89,0,7.64],
// 4 30 .89 0 7.64 .78 0 6.85 1.55 0 6.7 1.76 0 7.47
  [4,30,.89,0,7.64,.78,0,6.85,1.55,0,6.7,1.76,0,7.47],
// 4 30 1.76 0 7.47 1.55 0 6.7 2.3 0 6.44 2.6 0 7.18
  [4,30,1.76,0,7.47,1.55,0,6.7,2.3,0,6.44,2.6,0,7.18],
// 4 30 2.6 0 7.18 2.3 0 6.44 3 0 6.1 3.4 0 6.79
  [4,30,2.6,0,7.18,2.3,0,6.44,3,0,6.1,3.4,0,6.79],
// 4 30 3.4 0 6.79 3 0 6.1 3.65 0 5.66 4.14 0 6.29
  [4,30,3.4,0,6.79,3,0,6.1,3.65,0,5.66,4.14,0,6.29],
// 4 30 4.14 0 6.29 3.65 0 5.66 4.24 0 5.14 4.81 0 5.71
  [4,30,4.14,0,6.29,3.65,0,5.66,4.24,0,5.14,4.81,0,5.71],
// 4 30 4.81 0 5.71 4.24 0 5.14 4.76 0 4.55 5.39 0 5.04
  [4,30,4.81,0,5.71,4.24,0,5.14,4.76,0,4.55,5.39,0,5.04],
// 4 30 5.39 0 5.04 4.76 0 4.55 5.2 0 3.9 5.89 0 4.3
  [4,30,5.39,0,5.04,4.76,0,4.55,5.2,0,3.9,5.89,0,4.3],
// 4 30 5.89 0 4.3 5.2 0 3.9 5.54 0 3.2 6.28 0 3.5
  [4,30,5.89,0,4.3,5.2,0,3.9,5.54,0,3.2,6.28,0,3.5],
// 4 30 6.28 0 3.5 5.54 0 3.2 5.8 0 2.45 6.57 0 2.66
  [4,30,6.28,0,3.5,5.54,0,3.2,5.8,0,2.45,6.57,0,2.66],
// 4 30 6.57 0 2.66 5.8 0 2.45 5.95 0 1.68 6.74 0 1.79
  [4,30,6.57,0,2.66,5.8,0,2.45,5.95,0,1.68,6.74,0,1.79],
// 3 322 6.8 0 .9 6.74 0 .01 9 0 0
  [3,322,6.8,0,.9,6.74,0,.01,9,0,0],
// 4 322 6.74 0 1.79 6.8 0 .9 9 0 0 8.3151 0 3.4443
  [4,322,6.74,0,1.79,6.8,0,.9,9,0,0,8.3151,0,3.4443],
// 3 322 8.3151 0 3.4443 6.57 0 2.66 6.74 0 1.79
  [3,322,8.3151,0,3.4443,6.57,0,2.66,6.74,0,1.79],
// 3 322 6.28 0 3.5 6.57 0 2.66 8.3151 0 3.4443
  [3,322,6.28,0,3.5,6.57,0,2.66,8.3151,0,3.4443],
// 4 322 5.89 0 4.3 6.28 0 3.5 8.3151 0 3.4443 6.3639 0 6.3639
  [4,322,5.89,0,4.3,6.28,0,3.5,8.3151,0,3.4443,6.3639,0,6.3639],
// 3 322 6.3639 0 6.3639 5.39 0 5.04 5.89 0 4.3
  [3,322,6.3639,0,6.3639,5.39,0,5.04,5.89,0,4.3],
// 3 322 6.3639 0 6.3639 4.81 0 5.71 5.39 0 5.04
  [3,322,6.3639,0,6.3639,4.81,0,5.71,5.39,0,5.04],
// 4 322 4.14 0 6.29 4.81 0 5.71 6.3639 0 6.3639 3.4443 0 8.3151
  [4,322,4.14,0,6.29,4.81,0,5.71,6.3639,0,6.3639,3.4443,0,8.3151],
// 3 322 3.4443 0 8.3151 3.4 0 6.79 4.14 0 6.29
  [3,322,3.4443,0,8.3151,3.4,0,6.79,4.14,0,6.29],
// 3 322 3.4443 0 8.3151 2.6 0 7.18 3.4 0 6.79
  [3,322,3.4443,0,8.3151,2.6,0,7.18,3.4,0,6.79],
// 3 322 3.4443 0 8.3151 1.76 0 7.47 2.6 0 7.18
  [3,322,3.4443,0,8.3151,1.76,0,7.47,2.6,0,7.18],
// 4 322 .89 0 7.64 1.76 0 7.47 3.4443 0 8.3151 0 0 9
  [4,322,.89,0,7.64,1.76,0,7.47,3.4443,0,8.3151,0,0,9],
// 3 322 0 0 9 0 0 7.7 .89 0 7.64
  [3,322,0,0,9,0,0,7.7,.89,0,7.64],
// 3 322 6.74 0 .01 6.57 0 -.86 9 0 0
  [3,322,6.74,0,.01,6.57,0,-.86,9,0,0],
// 4 322 9 0 0 6.57 0 -.86 6.28 0 -1.7 8.3151 0 -3.4443
  [4,322,9,0,0,6.57,0,-.86,6.28,0,-1.7,8.3151,0,-3.4443],
// 3 322 6.28 0 -1.7 5.89 0 -2.5 8.3151 0 -3.4443
  [3,322,6.28,0,-1.7,5.89,0,-2.5,8.3151,0,-3.4443],
// 4 322 8.3151 0 -3.4443 5.89 0 -2.5 5.39 0 -3.24 6.3639 0 -6.3639
  [4,322,8.3151,0,-3.4443,5.89,0,-2.5,5.39,0,-3.24,6.3639,0,-6.3639],
// 4 322 6.3639 0 -6.3639 5.39 0 -3.24 4.81 0 -3.91 4.14 0 -4.85
  [4,322,6.3639,0,-6.3639,5.39,0,-3.24,4.81,0,-3.91,4.14,0,-4.85],
// 4 30 5 0 -.4 4.92 0 .02 3.15 0 -2.68 4.92 0 -.82
  [4,30,5,0,-.4,4.92,0,.02,3.15,0,-2.68,4.92,0,-.82],
// 3 30 4.92 0 -.82 3.15 0 -2.68 4.68 0 -1.18
  [3,30,4.92,0,-.82,3.15,0,-2.68,4.68,0,-1.18],
// 4 30 3.48 0 .62 3.15 0 .38 3.15 0 -2.68 3.9 0 .7
  [4,30,3.48,0,.62,3.15,0,.38,3.15,0,-2.68,3.9,0,.7],
// 4 30 4.32 0 .62 3.9 0 .7 3.15 0 -2.68 4.68 0 .38
  [4,30,4.32,0,.62,3.9,0,.7,3.15,0,-2.68,4.68,0,.38],
// 3 30 4.68 0 .38 3.15 0 -2.68 4.92 0 .02
  [3,30,4.68,0,.38,3.15,0,-2.68,4.92,0,.02],
// 4 30 1.38 0 -.82 1.62 0 -1.18 3.15 0 -2.68 1.3 0 -.4
  [4,30,1.38,0,-.82,1.62,0,-1.18,3.15,0,-2.68,1.3,0,-.4],
// 4 30 1.38 0 .02 1.3 0 -.4 3.15 0 -2.68 1.62 0 .38
  [4,30,1.38,0,.02,1.3,0,-.4,3.15,0,-2.68,1.62,0,.38],
// 4 30 1.98 0 .62 1.62 0 .38 3.15 0 -2.68 2.4 0 .7
  [4,30,1.98,0,.62,1.62,0,.38,3.15,0,-2.68,2.4,0,.7],
// 4 30 2.82 0 .62 2.4 0 .7 3.15 0 -2.68 3.15 0 .38
  [4,30,2.82,0,.62,2.4,0,.7,3.15,0,-2.68,3.15,0,.38],
// 4 30 1.2 0 -3.3 1.13 0 -3.05 .7 0 -3.3 1.13 0 -3.55
  [4,30,1.2,0,-3.3,1.13,0,-3.05,.7,0,-3.3,1.13,0,-3.55],
// 4 30 .95 0 -3.73 1.13 0 -3.55 .7 0 -3.3 .7 0 -3.8
  [4,30,.95,0,-3.73,1.13,0,-3.55,.7,0,-3.3,.7,0,-3.8],
// 4 30 .45 0 -3.73 .7 0 -3.8 .7 0 -3.3 .27 0 -3.55
  [4,30,.45,0,-3.73,.7,0,-3.8,.7,0,-3.3,.27,0,-3.55],
// 4 30 .2 0 -3.3 .27 0 -3.55 .7 0 -3.3 .27 0 -3.05
  [4,30,.2,0,-3.3,.27,0,-3.55,.7,0,-3.3,.27,0,-3.05],
// 4 30 .45 0 -2.87 .27 0 -3.05 .7 0 -3.3 .7 0 -2.8
  [4,30,.45,0,-2.87,.27,0,-3.05,.7,0,-3.3,.7,0,-2.8],
// 4 30 .95 0 -2.87 .7 0 -2.8 .7 0 -3.3 1.13 0 -3.05
  [4,30,.95,0,-2.87,.7,0,-2.8,.7,0,-3.3,1.13,0,-3.05],
// 4 30 4.14 0 -4.49 3.65 0 -3.86 3.44 0 -4.13 3.35 0 -4.39
  [4,30,4.14,0,-4.49,3.65,0,-3.86,3.44,0,-4.13,3.35,0,-4.39],
// 4 30 4.14 0 -4.49 3.35 0 -4.39 3.34 0 -4.6 3.34 0 -4.85
  [4,30,4.14,0,-4.49,3.35,0,-4.39,3.34,0,-4.6,3.34,0,-4.85],
// 4 30 4.14 0 -4.85 3.34 0 -4.85 3.28 0 -5.16 4.02 0 -5.46
  [4,30,4.14,0,-4.85,3.34,0,-4.85,3.28,0,-5.16,4.02,0,-5.46],
// 4 30 4.02 0 -5.46 3.28 0 -5.16 3.11 0 -5.42 3.67 0 -5.98
  [4,30,4.02,0,-5.46,3.28,0,-5.16,3.11,0,-5.42,3.67,0,-5.98],
// 4 30 3.67 0 -5.98 3.11 0 -5.42 2.85 0 -5.59 3.15 0 -6.33
  [4,30,3.67,0,-5.98,3.11,0,-5.42,2.85,0,-5.59,3.15,0,-6.33],
// 4 30 3.15 0 -6.33 2.85 0 -5.59 2.54 0 -5.65 2.54 0 -6.45
  [4,30,3.15,0,-6.33,2.85,0,-5.59,2.54,0,-5.65,2.54,0,-6.45],
// 3 30 4.14 0 -4.49 3.34 0 -4.85 4.14 0 -4.85
  [3,30,4.14,0,-4.49,3.34,0,-4.85,4.14,0,-4.85],
// 4 30 2.3 0 -5.65 2.3 0 -4.9 2.25 0 -4.7 2.1 0 -4.55
  [4,30,2.3,0,-5.65,2.3,0,-4.9,2.25,0,-4.7,2.1,0,-4.55],
// 4 30 1.5 0 -4.9 1.5 0 -5.65 2.3 0 -5.65 1.55 0 -4.7
  [4,30,1.5,0,-4.9,1.5,0,-5.65,2.3,0,-5.65,1.55,0,-4.7],
// 4 30 1.7 0 -4.55 1.55 0 -4.7 2.3 0 -5.65 1.9 0 -4.5
  [4,30,1.7,0,-4.55,1.55,0,-4.7,2.3,0,-5.65,1.9,0,-4.5],
// 3 30 1.9 0 -4.5 2.3 0 -5.65 2.1 0 -4.55
  [3,30,1.9,0,-4.5,2.3,0,-5.65,2.1,0,-4.55],
// 4 30 .4 0 -5.65 .4 0 -4.9 .35 0 -4.7 .2 0 -4.55
  [4,30,.4,0,-5.65,.4,0,-4.9,.35,0,-4.7,.2,0,-4.55],
// 3 30 0 0 -4.5 .4 0 -5.65 .2 0 -4.55
  [3,30,0,0,-4.5,.4,0,-5.65,.2,0,-4.55],
// 3 30 2.54 0 -5.65 2.3 0 -5.65 2.54 0 -6.45
  [3,30,2.54,0,-5.65,2.3,0,-5.65,2.54,0,-6.45],
// 3 30 2.3 0 -5.65 1.5 0 -5.65 2.54 0 -6.45
  [3,30,2.3,0,-5.65,1.5,0,-5.65,2.54,0,-6.45],
// 4 30 2.54 0 -6.45 1.5 0 -5.65 .4 0 -5.65 -2.54 0 -6.45
  [4,30,2.54,0,-6.45,1.5,0,-5.65,.4,0,-5.65,-2.54,0,-6.45],
// 4 16 2.85 0 -5.59 3.11 0 -5.42 3.28 0 -5.16 3.34 0 -4.85
  [4,16,2.85,0,-5.59,3.11,0,-5.42,3.28,0,-5.16,3.34,0,-4.85],
// 4 16 2.54 0 -5.65 2.85 0 -5.59 3.34 0 -4.85 2.3 0 -5.65
  [4,16,2.54,0,-5.65,2.85,0,-5.59,3.34,0,-4.85,2.3,0,-5.65],
// 4 16 2.3 0 -4.9 2.3 0 -5.65 3.34 0 -4.85 3.34 0 -4.6
  [4,16,2.3,0,-4.9,2.3,0,-5.65,3.34,0,-4.85,3.34,0,-4.6],
// 3 16 3.34 0 -4.6 2.25 0 -4.7 2.3 0 -4.9
  [3,16,3.34,0,-4.6,2.25,0,-4.7,2.3,0,-4.9],
// 4 16 2.1 0 -4.55 2.25 0 -4.7 3.34 0 -4.6 3.35 0 -4.39
  [4,16,2.1,0,-4.55,2.25,0,-4.7,3.34,0,-4.6,3.35,0,-4.39],
// 3 16 3.44 0 -4.13 2.1 0 -4.55 3.35 0 -4.39
  [3,16,3.44,0,-4.13,2.1,0,-4.55,3.35,0,-4.39],
// 4 16 2.1 0 -4.55 3.44 0 -4.13 3.65 0 -3.86 1.9 0 -4.5
  [4,16,2.1,0,-4.55,3.44,0,-4.13,3.65,0,-3.86,1.9,0,-4.5],
// 4 16 1.9 0 -4.5 3.65 0 -3.86 1.2 0 -3.3 1.13 0 -3.55
  [4,16,1.9,0,-4.5,3.65,0,-3.86,1.2,0,-3.3,1.13,0,-3.55],
// 3 16 1.13 0 -3.55 1.7 0 -4.55 1.9 0 -4.5
  [3,16,1.13,0,-3.55,1.7,0,-4.55,1.9,0,-4.5],
// 4 16 1.55 0 -4.7 1.7 0 -4.55 1.13 0 -3.55 .95 0 -3.73
  [4,16,1.55,0,-4.7,1.7,0,-4.55,1.13,0,-3.55,.95,0,-3.73],
// 4 16 1.55 0 -4.7 .95 0 -3.73 .7 0 -3.8 .2 0 -4.55
  [4,16,1.55,0,-4.7,.95,0,-3.73,.7,0,-3.8,.2,0,-4.55],
// 4 16 0 0 -4.5 .2 0 -4.55 .7 0 -3.8 .45 0 -3.73
  [4,16,0,0,-4.5,.2,0,-4.55,.7,0,-3.8,.45,0,-3.73],
// 3 16 .27 0 -3.55 0 0 -4.5 .45 0 -3.73
  [3,16,.27,0,-3.55,0,0,-4.5,.45,0,-3.73],
// 3 16 .2 0 -4.55 .35 0 -4.7 1.55 0 -4.7
  [3,16,.2,0,-4.55,.35,0,-4.7,1.55,0,-4.7],
// 4 16 .4 0 -4.9 1.5 0 -4.9 1.55 0 -4.7 .35 0 -4.7
  [4,16,.4,0,-4.9,1.5,0,-4.9,1.55,0,-4.7,.35,0,-4.7],
// 4 16 1.5 0 -5.65 1.5 0 -4.9 .4 0 -4.9 .4 0 -5.65
  [4,16,1.5,0,-5.65,1.5,0,-4.9,.4,0,-4.9,.4,0,-5.65],
// 4 16 3.65 0 -3.86 4.24 0 -3.34 3.15 0 -2.68 1.2 0 -3.3
  [4,16,3.65,0,-3.86,4.24,0,-3.34,3.15,0,-2.68,1.2,0,-3.3],
// 3 16 3.15 0 -2.68 1.13 0 -3.05 1.2 0 -3.3
  [3,16,3.15,0,-2.68,1.13,0,-3.05,1.2,0,-3.3],
// 4 16 .95 0 -2.87 1.13 0 -3.05 3.15 0 -2.68 1.62 0 -1.18
  [4,16,.95,0,-2.87,1.13,0,-3.05,3.15,0,-2.68,1.62,0,-1.18],
// 4 16 .7 0 -2.8 .95 0 -2.87 1.62 0 -1.18 1.38 0 -.82
  [4,16,.7,0,-2.8,.95,0,-2.87,1.62,0,-1.18,1.38,0,-.82],
// 4 16 3.15 0 -2.68 4.24 0 -3.34 4.76 0 -2.75 5.2 0 -2.1
  [4,16,3.15,0,-2.68,4.24,0,-3.34,4.76,0,-2.75,5.2,0,-2.1],
// 4 16 4.68 0 -1.18 3.15 0 -2.68 5.2 0 -2.1 5.54 0 -1.4
  [4,16,4.68,0,-1.18,3.15,0,-2.68,5.2,0,-2.1,5.54,0,-1.4],
// 4 16 4.92 0 -.82 4.68 0 -1.18 5.54 0 -1.4 5.8 0 -.65
  [4,16,4.92,0,-.82,4.68,0,-1.18,5.54,0,-1.4,5.8,0,-.65],
// 4 16 5 0 -.4 4.92 0 -.82 5.8 0 -.65 5.95 0 .12
  [4,16,5,0,-.4,4.92,0,-.82,5.8,0,-.65,5.95,0,.12],
// 4 16 4.92 0 .02 5 0 -.4 5.95 0 .12 6 0 .9
  [4,16,4.92,0,.02,5,0,-.4,5.95,0,.12,6,0,.9],
// 3 16 6 0 .9 4.68 0 .38 4.92 0 .02
  [3,16,6,0,.9,4.68,0,.38,4.92,0,.02],
// 4 16 4.32 0 .62 4.68 0 .38 6 0 .9 5.95 0 1.68
  [4,16,4.32,0,.62,4.68,0,.38,6,0,.9,5.95,0,1.68],
// 4 16 4.32 0 .62 5.95 0 1.68 5.8 0 2.45 3.9 0 .7
  [4,16,4.32,0,.62,5.95,0,1.68,5.8,0,2.45,3.9,0,.7],
// 4 16 3.9 0 .7 5.8 0 2.45 5.54 0 3.2 5.2 0 3.9
  [4,16,3.9,0,.7,5.8,0,2.45,5.54,0,3.2,5.2,0,3.9],
// 4 16 3.48 0 .62 3.9 0 .7 5.2 0 3.9 2.82 0 .62
  [4,16,3.48,0,.62,3.9,0,.7,5.2,0,3.9,2.82,0,.62],
// 3 16 2.82 0 .62 3.15 0 .38 3.48 0 .62
  [3,16,2.82,0,.62,3.15,0,.38,3.48,0,.62],
// 4 16 2.4 0 .7 2.82 0 .62 5.2 0 3.9 4.76 0 4.55
  [4,16,2.4,0,.7,2.82,0,.62,5.2,0,3.9,4.76,0,4.55],
// 4 16 2.4 0 .7 4.76 0 4.55 4.24 0 5.14 3.65 0 5.66
  [4,16,2.4,0,.7,4.76,0,4.55,4.24,0,5.14,3.65,0,5.66],
// 4 16 1.98 0 .62 2.4 0 .7 3.65 0 5.66 3 0 6.1
  [4,16,1.98,0,.62,2.4,0,.7,3.65,0,5.66,3,0,6.1],
// 4 16 1.98 0 .62 3 0 6.1 2.3 0 6.44 1.55 0 6.7
  [4,16,1.98,0,.62,3,0,6.1,2.3,0,6.44,1.55,0,6.7],
// 4 16 1.98 0 .62 1.55 0 6.7 .78 0 6.85 0 0 6.9
  [4,16,1.98,0,.62,1.55,0,6.7,.78,0,6.85,0,0,6.9],
// 3 16 0 0 6.9 1.62 0 .38 1.98 0 .62
  [3,16,0,0,6.9,1.62,0,.38,1.98,0,.62],
// 3 16 0 0 6.9 1.38 0 .02 1.62 0 .38
  [3,16,0,0,6.9,1.38,0,.02,1.62,0,.38],
// 4 16 -1.38 0 .02 -1.3 0 -.4 1.3 0 -.4 1.38 0 .02
  [4,16,-1.38,0,.02,-1.3,0,-.4,1.3,0,-.4,1.38,0,.02],
// 4 16 -1.3 0 -.4 -1.38 0 -.82 1.38 0 -.82 1.3 0 -.4
  [4,16,-1.3,0,-.4,-1.38,0,-.82,1.38,0,-.82,1.3,0,-.4],
// 4 16 1.38 0 -.82 -1.38 0 -.82 -.45 0 -2.87 .45 0 -2.87
  [4,16,1.38,0,-.82,-1.38,0,-.82,-.45,0,-2.87,.45,0,-2.87],
// 3 16 1.38 0 -.82 .45 0 -2.87 .7 0 -2.8
  [3,16,1.38,0,-.82,.45,0,-2.87,.7,0,-2.8],
// 3 16 -1.38 0 -.82 -.7 0 -2.8 -.45 0 -2.87
  [3,16,-1.38,0,-.82,-.7,0,-2.8,-.45,0,-2.87],
// 4 16 -.45 0 -2.87 -.27 0 -3.05 .27 0 -3.05 .45 0 -2.87
  [4,16,-.45,0,-2.87,-.27,0,-3.05,.27,0,-3.05,.45,0,-2.87],
// 4 16 -.27 0 -3.05 -.2 0 -3.3 .2 0 -3.3 .27 0 -3.05
  [4,16,-.27,0,-3.05,-.2,0,-3.3,.2,0,-3.3,.27,0,-3.05],
// 4 16 -.2 0 -3.3 -.27 0 -3.55 .27 0 -3.55 .2 0 -3.3
  [4,16,-.2,0,-3.3,-.27,0,-3.55,.27,0,-3.55,.2,0,-3.3],
// 3 30 .4 0 -5.65 -.4 0 -5.65 -2.54 0 -6.45
  [3,30,.4,0,-5.65,-.4,0,-5.65,-2.54,0,-6.45],
// 3 322 -4.81 0 -3.91 -4.14 0 -4.85 -4.14 0 -4.49
  [3,322,-4.81,0,-3.91,-4.14,0,-4.85,-4.14,0,-4.49],
// 3 322 -4.14 0 -4.85 -6.3639 0 -6.3639 -4.02 0 -5.46
  [3,322,-4.14,0,-4.85,-6.3639,0,-6.3639,-4.02,0,-5.46],
// 4 322 -3.67 0 -5.98 -4.02 0 -5.46 -6.3639 0 -6.3639 -3.4443 0 -8.3151
  [4,322,-3.67,0,-5.98,-4.02,0,-5.46,-6.3639,0,-6.3639,-3.4443,0,-8.3151],
// 3 322 -3.67 0 -5.98 -3.4443 0 -8.3151 -3.15 0 -6.33
  [3,322,-3.67,0,-5.98,-3.4443,0,-8.3151,-3.15,0,-6.33],
// 4 322 -2.54 0 -6.45 -3.15 0 -6.33 -3.4443 0 -8.3151 0 0 -9
  [4,322,-2.54,0,-6.45,-3.15,0,-6.33,-3.4443,0,-8.3151,0,0,-9],
// 4 322 2.54 0 -6.45 -2.54 0 -6.45 0 0 -9 3.4443 0 -8.3151
  [4,322,2.54,0,-6.45,-2.54,0,-6.45,0,0,-9,3.4443,0,-8.3151],
// 3 322 3.15 0 -6.33 2.54 0 -6.45 3.4443 0 -8.3151
  [3,322,3.15,0,-6.33,2.54,0,-6.45,3.4443,0,-8.3151],
// 4 322 3.67 0 -5.98 3.15 0 -6.33 3.4443 0 -8.3151 6.3639 0 -6.3639
  [4,322,3.67,0,-5.98,3.15,0,-6.33,3.4443,0,-8.3151,6.3639,0,-6.3639],
// 3 322 4.02 0 -5.46 3.67 0 -5.98 6.3639 0 -6.3639
  [3,322,4.02,0,-5.46,3.67,0,-5.98,6.3639,0,-6.3639],
// 3 322 4.14 0 -4.85 4.02 0 -5.46 6.3639 0 -6.3639
  [3,322,4.14,0,-4.85,4.02,0,-5.46,6.3639,0,-6.3639],
// 3 322 4.81 0 -3.91 4.14 0 -4.49 4.14 0 -4.85
  [3,322,4.81,0,-3.91,4.14,0,-4.49,4.14,0,-4.85],
];
module ldraw_lib__98138p1c(step=0, col=false, unit=2/5, alt=false, line=0.2, solid=!$preview)
    makepoly(ldraw_lib__98138p1c(solid), step=step, col=col, unit=unit, alt=alt, line=line, solid=solid);
ldraw_lib__98138p1c(line=0.2);
